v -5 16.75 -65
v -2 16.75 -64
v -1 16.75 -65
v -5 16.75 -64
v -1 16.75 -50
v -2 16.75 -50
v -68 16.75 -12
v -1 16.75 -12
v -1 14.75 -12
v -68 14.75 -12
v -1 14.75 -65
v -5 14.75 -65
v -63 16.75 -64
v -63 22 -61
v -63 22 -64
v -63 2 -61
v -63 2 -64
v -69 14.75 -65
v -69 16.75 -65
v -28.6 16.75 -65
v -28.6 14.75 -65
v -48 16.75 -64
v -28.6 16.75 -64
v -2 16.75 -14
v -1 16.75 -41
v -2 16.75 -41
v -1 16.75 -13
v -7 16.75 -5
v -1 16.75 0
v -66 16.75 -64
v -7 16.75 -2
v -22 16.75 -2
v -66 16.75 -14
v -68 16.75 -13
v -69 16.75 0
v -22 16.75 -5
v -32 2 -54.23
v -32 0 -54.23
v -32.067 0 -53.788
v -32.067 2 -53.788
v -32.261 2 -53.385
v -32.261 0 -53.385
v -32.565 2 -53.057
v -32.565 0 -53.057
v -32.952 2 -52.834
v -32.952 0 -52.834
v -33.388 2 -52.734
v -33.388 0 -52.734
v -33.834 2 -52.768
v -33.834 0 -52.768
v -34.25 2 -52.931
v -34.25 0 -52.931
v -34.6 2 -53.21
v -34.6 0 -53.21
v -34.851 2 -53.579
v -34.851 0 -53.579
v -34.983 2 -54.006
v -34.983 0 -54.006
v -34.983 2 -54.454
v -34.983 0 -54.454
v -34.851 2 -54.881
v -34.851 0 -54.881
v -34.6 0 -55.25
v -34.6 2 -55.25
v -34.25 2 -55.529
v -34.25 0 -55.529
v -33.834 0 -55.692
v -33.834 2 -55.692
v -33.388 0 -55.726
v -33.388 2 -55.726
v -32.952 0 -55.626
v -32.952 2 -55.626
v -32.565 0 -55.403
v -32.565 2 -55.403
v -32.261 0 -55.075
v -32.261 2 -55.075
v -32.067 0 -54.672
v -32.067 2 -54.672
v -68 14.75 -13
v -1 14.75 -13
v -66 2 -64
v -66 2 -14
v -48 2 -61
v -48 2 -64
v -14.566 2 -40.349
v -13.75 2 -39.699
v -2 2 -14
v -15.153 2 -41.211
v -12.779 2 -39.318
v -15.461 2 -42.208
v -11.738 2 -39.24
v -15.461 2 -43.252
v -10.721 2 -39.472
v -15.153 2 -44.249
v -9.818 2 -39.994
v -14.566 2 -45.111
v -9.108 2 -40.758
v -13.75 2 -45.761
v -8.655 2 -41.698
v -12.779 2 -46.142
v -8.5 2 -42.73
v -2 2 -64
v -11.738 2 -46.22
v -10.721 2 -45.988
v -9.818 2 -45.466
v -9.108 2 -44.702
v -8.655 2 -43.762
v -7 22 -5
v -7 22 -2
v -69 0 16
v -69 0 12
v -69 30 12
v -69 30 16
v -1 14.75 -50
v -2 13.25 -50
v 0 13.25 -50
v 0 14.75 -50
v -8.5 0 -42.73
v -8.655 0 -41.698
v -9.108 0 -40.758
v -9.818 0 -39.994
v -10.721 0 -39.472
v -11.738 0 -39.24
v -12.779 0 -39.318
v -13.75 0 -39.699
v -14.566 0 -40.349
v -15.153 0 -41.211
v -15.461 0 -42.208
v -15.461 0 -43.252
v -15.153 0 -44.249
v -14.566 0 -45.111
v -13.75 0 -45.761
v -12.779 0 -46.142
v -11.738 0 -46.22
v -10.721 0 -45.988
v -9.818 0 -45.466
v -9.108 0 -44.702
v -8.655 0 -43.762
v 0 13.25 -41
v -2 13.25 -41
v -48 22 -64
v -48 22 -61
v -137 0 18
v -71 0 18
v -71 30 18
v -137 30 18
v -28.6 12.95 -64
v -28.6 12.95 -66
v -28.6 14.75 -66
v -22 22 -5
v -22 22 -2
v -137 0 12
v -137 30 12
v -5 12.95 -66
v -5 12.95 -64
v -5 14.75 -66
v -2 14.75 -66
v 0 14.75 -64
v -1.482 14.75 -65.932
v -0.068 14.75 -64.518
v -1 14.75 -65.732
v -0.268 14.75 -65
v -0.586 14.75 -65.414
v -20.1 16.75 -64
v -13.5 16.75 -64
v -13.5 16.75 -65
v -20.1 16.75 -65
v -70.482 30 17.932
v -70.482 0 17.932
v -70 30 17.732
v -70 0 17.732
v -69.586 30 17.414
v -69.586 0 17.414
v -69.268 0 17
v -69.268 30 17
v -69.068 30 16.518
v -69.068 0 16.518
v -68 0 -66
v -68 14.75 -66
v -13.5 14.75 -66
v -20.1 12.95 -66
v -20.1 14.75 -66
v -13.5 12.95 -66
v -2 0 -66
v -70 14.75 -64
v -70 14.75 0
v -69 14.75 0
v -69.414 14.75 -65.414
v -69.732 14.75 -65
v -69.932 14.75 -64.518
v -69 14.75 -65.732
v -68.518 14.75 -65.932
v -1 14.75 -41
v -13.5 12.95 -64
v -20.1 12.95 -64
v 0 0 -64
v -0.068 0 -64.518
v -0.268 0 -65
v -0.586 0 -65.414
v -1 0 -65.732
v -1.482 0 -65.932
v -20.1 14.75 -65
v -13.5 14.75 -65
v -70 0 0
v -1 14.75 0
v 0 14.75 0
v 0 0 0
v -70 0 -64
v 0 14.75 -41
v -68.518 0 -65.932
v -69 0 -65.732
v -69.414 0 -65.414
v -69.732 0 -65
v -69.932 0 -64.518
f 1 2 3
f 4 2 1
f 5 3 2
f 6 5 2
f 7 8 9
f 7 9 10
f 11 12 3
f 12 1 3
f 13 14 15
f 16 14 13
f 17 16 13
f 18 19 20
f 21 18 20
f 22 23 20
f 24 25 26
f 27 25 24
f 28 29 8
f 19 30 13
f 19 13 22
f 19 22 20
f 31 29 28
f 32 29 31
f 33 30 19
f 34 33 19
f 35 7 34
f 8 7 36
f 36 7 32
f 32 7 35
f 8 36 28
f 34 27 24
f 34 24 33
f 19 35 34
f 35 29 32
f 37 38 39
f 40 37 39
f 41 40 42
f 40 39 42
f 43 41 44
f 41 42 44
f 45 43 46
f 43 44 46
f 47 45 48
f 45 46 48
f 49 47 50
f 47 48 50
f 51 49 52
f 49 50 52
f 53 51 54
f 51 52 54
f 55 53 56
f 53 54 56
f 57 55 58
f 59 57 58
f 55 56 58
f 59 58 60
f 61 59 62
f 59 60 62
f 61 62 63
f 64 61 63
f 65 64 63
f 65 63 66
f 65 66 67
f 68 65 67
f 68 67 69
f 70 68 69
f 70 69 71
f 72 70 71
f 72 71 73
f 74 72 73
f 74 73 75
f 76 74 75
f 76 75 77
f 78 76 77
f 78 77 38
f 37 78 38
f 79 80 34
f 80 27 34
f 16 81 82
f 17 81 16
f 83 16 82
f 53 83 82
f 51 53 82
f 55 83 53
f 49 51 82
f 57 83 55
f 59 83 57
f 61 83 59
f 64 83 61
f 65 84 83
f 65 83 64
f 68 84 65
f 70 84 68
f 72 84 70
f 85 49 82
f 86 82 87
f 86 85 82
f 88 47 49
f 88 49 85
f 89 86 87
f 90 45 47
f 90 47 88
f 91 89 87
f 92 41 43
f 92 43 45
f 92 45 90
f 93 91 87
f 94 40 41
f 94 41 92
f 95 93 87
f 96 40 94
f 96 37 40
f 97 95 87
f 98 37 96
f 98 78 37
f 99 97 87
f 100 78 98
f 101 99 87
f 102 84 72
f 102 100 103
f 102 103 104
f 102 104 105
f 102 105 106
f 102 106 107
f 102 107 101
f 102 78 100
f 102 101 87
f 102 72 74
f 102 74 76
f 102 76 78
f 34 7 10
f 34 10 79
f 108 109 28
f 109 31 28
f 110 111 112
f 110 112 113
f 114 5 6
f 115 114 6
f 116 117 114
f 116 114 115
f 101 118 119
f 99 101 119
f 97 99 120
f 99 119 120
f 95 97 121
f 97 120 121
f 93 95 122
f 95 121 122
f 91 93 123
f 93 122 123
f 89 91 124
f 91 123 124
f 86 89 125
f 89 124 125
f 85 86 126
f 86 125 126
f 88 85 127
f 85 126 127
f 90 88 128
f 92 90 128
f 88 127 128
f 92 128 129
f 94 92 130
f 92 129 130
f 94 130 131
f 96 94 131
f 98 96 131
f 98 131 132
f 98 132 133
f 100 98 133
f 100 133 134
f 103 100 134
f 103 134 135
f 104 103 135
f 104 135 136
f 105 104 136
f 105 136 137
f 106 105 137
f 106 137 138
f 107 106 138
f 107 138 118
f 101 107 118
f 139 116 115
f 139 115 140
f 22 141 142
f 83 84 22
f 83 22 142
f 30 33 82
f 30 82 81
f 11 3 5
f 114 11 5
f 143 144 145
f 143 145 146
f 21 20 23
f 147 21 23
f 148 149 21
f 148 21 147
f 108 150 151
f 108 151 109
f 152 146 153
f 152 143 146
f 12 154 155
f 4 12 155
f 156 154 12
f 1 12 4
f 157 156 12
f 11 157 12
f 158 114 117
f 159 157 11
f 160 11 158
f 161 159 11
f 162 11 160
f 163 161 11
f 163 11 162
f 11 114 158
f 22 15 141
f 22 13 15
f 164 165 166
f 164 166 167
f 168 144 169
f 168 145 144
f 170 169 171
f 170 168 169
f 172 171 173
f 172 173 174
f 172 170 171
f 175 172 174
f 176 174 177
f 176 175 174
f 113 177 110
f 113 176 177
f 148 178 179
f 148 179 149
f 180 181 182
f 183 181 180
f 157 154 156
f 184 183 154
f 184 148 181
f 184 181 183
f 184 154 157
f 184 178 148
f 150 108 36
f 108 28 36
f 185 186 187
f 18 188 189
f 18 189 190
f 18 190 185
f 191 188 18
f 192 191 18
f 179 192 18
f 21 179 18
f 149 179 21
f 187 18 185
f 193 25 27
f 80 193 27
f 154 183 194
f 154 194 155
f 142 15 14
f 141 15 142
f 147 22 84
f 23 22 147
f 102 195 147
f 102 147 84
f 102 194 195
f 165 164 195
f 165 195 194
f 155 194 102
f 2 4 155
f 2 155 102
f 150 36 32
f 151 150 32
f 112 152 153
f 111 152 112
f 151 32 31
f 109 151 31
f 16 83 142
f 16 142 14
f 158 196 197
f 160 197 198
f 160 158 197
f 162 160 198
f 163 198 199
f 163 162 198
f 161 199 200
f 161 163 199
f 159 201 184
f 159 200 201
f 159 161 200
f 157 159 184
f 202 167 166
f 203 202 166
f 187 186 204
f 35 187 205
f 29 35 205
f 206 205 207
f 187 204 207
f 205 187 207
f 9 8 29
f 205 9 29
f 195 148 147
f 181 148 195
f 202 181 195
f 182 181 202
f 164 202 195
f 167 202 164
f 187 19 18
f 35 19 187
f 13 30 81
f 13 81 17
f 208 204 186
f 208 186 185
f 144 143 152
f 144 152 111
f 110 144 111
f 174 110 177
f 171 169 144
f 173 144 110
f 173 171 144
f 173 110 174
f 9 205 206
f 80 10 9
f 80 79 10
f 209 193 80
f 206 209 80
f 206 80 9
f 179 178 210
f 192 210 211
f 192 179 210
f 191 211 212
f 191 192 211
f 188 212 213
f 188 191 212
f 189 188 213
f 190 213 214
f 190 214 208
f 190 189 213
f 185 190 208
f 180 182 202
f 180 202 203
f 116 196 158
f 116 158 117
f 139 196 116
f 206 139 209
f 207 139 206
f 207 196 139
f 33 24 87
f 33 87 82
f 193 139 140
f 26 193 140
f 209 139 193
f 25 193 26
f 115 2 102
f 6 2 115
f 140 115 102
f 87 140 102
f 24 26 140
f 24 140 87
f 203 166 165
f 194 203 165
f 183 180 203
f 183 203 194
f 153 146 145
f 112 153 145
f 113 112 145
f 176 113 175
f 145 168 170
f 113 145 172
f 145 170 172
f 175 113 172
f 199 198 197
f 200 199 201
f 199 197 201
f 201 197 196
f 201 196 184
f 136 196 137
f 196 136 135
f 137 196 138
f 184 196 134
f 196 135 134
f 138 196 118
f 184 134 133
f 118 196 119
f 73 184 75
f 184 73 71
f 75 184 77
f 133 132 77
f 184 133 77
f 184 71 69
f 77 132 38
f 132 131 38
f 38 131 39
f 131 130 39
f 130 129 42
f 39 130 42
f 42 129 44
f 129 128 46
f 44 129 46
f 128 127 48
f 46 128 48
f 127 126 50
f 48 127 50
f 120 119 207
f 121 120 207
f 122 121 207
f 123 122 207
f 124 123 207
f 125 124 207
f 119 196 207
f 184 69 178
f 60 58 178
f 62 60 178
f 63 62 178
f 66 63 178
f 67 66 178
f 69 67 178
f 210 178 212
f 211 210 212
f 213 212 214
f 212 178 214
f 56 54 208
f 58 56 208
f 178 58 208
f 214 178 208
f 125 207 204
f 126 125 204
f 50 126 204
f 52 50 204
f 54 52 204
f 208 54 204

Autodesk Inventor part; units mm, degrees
ref_plane "YZ Plane" through (0, 0, 0) normal (1, 0, 0) x (0, 1, 0)
ref_plane "XZ Plane" through (0, 0, 0) normal (0, 1, 0) x (-1, 0, 0)
ref_plane "XY Plane" through (0, 0, 0) normal (0, 0, 1) x (1, 0, 0)
sketch "Sketch1" plane through (0, 0, 0) normal (0, 1, 0) x (-1, 0, 0)
  point P0 (0, 0)
sketch "Sketch2" plane through (0, 0, 0) normal (0, 1, 0) x (-1, 0, 0)
  line L0 (70, 0) -> (70, -66)
  line L1 (70, -66) -> (0, -66)
  line L2 (0, -66) -> (0, 0)
  line L3 (70, 0) -> (0, 0)
  point P0 (0, 0)
  dimension "d0" = 70
  dimension "d138" = 66
extrude "Extrusion1" add sketch "Sketch2" along normal blind 16.75
sketch "Sketch3" plane through (0, 16.75, 0) normal (0, 1, 0) x (1, 0, 0)
  line L0 (0, 66) -> (-70, 66) projected
  line L1 (-70, 66) -> (-2, 66)
  line L2 (-70, 66) -> (-2, 66)
  line L3 (-2, 66) -> (-70, 66)
  line L4 (-70, 66) -> (-70, 12)
  line L5 (-70, 12) -> (-2, 12)
  line L6 (-2, 66) -> (-2, 12)
  point P0 (0, 0)
  dimension "d135" = 68
  dimension "d136" = 54
sketch "Sketch4" plane through (0, 16.75, 0) normal (0, 1, 0) x (1, 0, 0)
  line L0 (0, 66) -> (-70, 66) projected
  line L1 (-30.4814, 66) -> (-28.4814, 66)
  line L2 (-28.4814, 66) -> (-28.4814, 64)
  line L3 (-70, 66) -> (-70, 0) projected
  line L4 (-70, 37.8423) -> (-70, 39.8423)
  line L5 (-70, 39.8423) -> (-68, 39.8423)
  line L6 (0, 38.8423) -> (0, 36.8423)
  line L7 (0, 36.8423) -> (-2, 36.8423)
  line L8 (-66, 64) -> (-2, 64)
  line L9 (-2, 64) -> (-2, 14)
  line L10 (-2, 14) -> (-66, 14)
  line L11 (-66, 14) -> (-66, 64)
  dimension "d5" = 2
  dimension "d6" = 2
  dimension "d7" = 2
  dimension "d11" = 2
  dimension "d75" = 2
  dimension "d132" = 50
  dimension "d133" = 64
extrude "Extrusion2" cut sketch "Sketch4" against normal blind 14.75
sketch "Sketch7" plane through (0, 16.75, 0) normal (0, 1, 0) x (1, 0, 0)
  line L0 (-70, 66) -> (-69, 66)
  line L1 (-70, 66) -> (-6, 66)
  line L2 (-70, 65) -> (-70, 66)
  line L3 (0, 66) -> (-7, 66)
  line L4 (-69, 65) -> (-1, 65)
  line L5 (0, 66) -> (-70, 66) projected
  line L6 (-70, 66) -> (0, 66)
  line L7 (0, 0) -> (0, 66) projected
  line L8 (0, 0) -> (-1, 0)
  line L9 (-1, 66) -> (0, 66)
  line L10 (0, 66) -> (0, 0)
  line L11 (0, 0) -> (-1, 0)
  line L12 (-70, 0) -> (0, 0) projected
  line L13 (-1, 65) -> (-1, 0)
  line L14 (0, 0) -> (-1, 0)
  line L15 (-69, 65) -> (-69, 0)
  line L16 (-70, 66) -> (-70, 0) projected
  line L17 (-69, 0) -> (-70, 0)
  line L18 (-70, 0) -> (-70, 66)
  dimension "d76" = 1
  dimension "d139" = 1
  dimension "d140" = 1
extrude "Extrusion3" cut sketch "Sketch7" against normal blind 2 contours L0 L1 L3 L7 L8 L13 L4 L15 L12 L16 L2
sketch "Sketch8" plane through (0, 16.75, 0) normal (0, 1, 0) x (1, 0, 0)
  line L0 (0, 12) -> (0, 13)
  line L1 (0, 13) -> (-68, 13)
  line L2 (0, 12) -> (-68, 12)
  line L3 (-68, 12) -> (-68, 13)
  line L4 (-69, 0) -> (-1, 0) projected
  point P0 (0, 0)
  point P1 (-70, 0)
  dimension "d46" = 68
  dimension "d141" = 1
extrude "Extrusion4" cut sketch "Sketch8" against normal blind 2
sketch "Sketch10" plane through (0, 2, 0) normal (0, 1, 0) x (1, 0, 0)
  line L0 (-31, 2) -> (-41, 2)
  line L1 (-63, 64) -> (-48, 64)
  line L2 (-48, 64) -> (-48, 61)
  line L3 (-48, 61) -> (-63, 61)
  line L4 (-63, 61) -> (-63, 64)
  line L5 (-22, 2) -> (-7, 2)
  line L6 (-7, 2) -> (-7, 5)
  line L7 (-7, 5) -> (-22, 5)
  line L8 (-22, 5) -> (-22, 2)
  line L9 (-66, 14) -> (-66, 64) projected
  line L10 (-2, 14) -> (-66, 14) projected
  line L11 (-66, 64) -> (-2, 64)
  line L12 (-2, 64) -> (-2, 14)
  line L13 (-2, 14) -> (-66, 14)
  line L14 (-66, 14) -> (-66, 64)
  point P0 (0, 0)
  point P1 (-21, 64)
  dimension "d57" = 15
  dimension "d58" = 3
  dimension "d61" = 15
  dimension "d79" = 3
extrude "Extrusion5" add sketch "Sketch10" along normal blind 20 contours L1 L2 L3 L4 | L8 L7 L6 L5
sketch "Sketch11" plane through (0, 0, 0) normal (0, -1, 0) x (1, 0, 0)
  circle A0 centre (-12, -42.73) radius 3.5
  circle A1 centre (-33.5, -54.23) radius 1.5
  line L0 (0, 0) -> (0, -66) projected
  line L1 (0, -66) -> (-70, -66) projected
  line L2 (-2, -64) -> (-2, -14) projected
  dimension "d85" = 23.27
  dimension "d86" = 21.5
  dimension "d88" = 7
  dimension "d89" = 3
  dimension "d119" = 11.5
  dimension "d120" = 10
extrude "Extrusion6" cut sketch "Sketch11" against normal blind 9
sketch "Sketch12" plane through (0, 0, 0) normal (0, -1, 0) x (1, 0, 0)
  line L0 (-70, 0) -> (-70, -66) projected
  line L1 (-69, 12) -> (-69, 18)
  line L2 (-69, 18) -> (-137, 18)
  line L3 (-137, 18) -> (-137, 12)
  line L4 (-137, 12) -> (-69, 12)
  line L5 (0, 0) -> (-70, 0) projected
  line L6 (0, 0) -> (-137.0429, 0)
  point P0 (-70, 0)
  dimension "d81" = 6
  dimension "d143" = 68
  dimension "d144" = 12
extrude "Extrusion7" add sketch "Sketch12" against normal blind 30
sketch "Sketch13" plane through (-70, 0, 6) normal (0, 0, 1) x (1, 0, 0)
  line L0 (0, 0) -> (0, 30) projected
  line L1 (70, 0) -> (70, 14.75) projected
  line L2 (0, 30) -> (70, 30) projected
  line L3 (35, 30) -> (35, 0)
  line L4 (0, 15) -> (70, 15)
  circle A0 centre (35, 15) radius 3.175
  point P0 (0, 14.75)
  point P1 (70, 16.75)
  dimension "d91" = 6.35
hole "Hole1" [suppressed]
sketch "Sketch14" plane through (0, 0, -66) normal (0, 0, -1) x (-1, 0, 0)
  line L0 (5, 16.95) -> (13.5, 16.95)
  line L1 (13.5, 16.95) -> (13.5, 12.95)
  line L2 (13.5, 12.95) -> (5, 12.95)
  line L3 (5, 12.95) -> (5, 16.95)
  line L4 (20.1, 16.95) -> (28.6, 16.95)
  line L5 (28.6, 16.95) -> (28.6, 12.95)
  line L6 (28.6, 12.95) -> (20.1, 12.95)
  line L7 (20.1, 12.95) -> (20.1, 16.95)
  line L8 (70, 14.75) -> (0, 14.75) projected
  line L9 (0, 0) -> (0, 14.75) projected
  point P0 (0, 16.75)
  dimension "d99" = 8.5
  dimension "d100" = 8.5
  dimension "d101" = 4
  dimension "d103" = 13.5
  dimension "d104" = 28.6
  dimension "d105" = 1.8
extrude "Extrusion8" cut sketch "Sketch14" against normal blind 10
sketch "Sketch15" plane through (0, 0, -66) normal (1, 0, 0) x (0, 0, -1)
  line L0 (-25, 18.25) -> (-16, 18.25)
  line L1 (-16, 18.25) -> (-16, 13.25)
  line L2 (-16, 13.25) -> (-25, 13.25)
  line L3 (-25, 13.25) -> (-25, 18.25)
  line L4 (-78, 0) -> (-78, 30) projected
  line L5 (0, 0) -> (0, 14.75) projected
  line L6 (0, 0) -> (-84, 0) projected
  line L7 (0, 14.75) -> (-66, 14.75) projected
  point P0 (-66, 0)
  point P1 (0, 16.75)
  dimension "d108" = 9
  dimension "d109" = 5
  dimension "d111" = 25
  dimension "d113" = 1.5
extrude "Extrusion9" cut sketch "Sketch15" against normal blind 10
thread "Thread1" size "M7x1" class "6H" standard "ANSI Metric M Profile" full length
fillet "Fillet7" radius 2 1 edges at (0, 7.375, -66)
fillet "Fillet8" radius 2 1 edges at (-70, 7.375, -66)
fillet "Fillet9" radius 2 1 edges at (-69, 15, 18)
fillet "Fillet10" [suppressed]
properties part number "Shell 2 top"
